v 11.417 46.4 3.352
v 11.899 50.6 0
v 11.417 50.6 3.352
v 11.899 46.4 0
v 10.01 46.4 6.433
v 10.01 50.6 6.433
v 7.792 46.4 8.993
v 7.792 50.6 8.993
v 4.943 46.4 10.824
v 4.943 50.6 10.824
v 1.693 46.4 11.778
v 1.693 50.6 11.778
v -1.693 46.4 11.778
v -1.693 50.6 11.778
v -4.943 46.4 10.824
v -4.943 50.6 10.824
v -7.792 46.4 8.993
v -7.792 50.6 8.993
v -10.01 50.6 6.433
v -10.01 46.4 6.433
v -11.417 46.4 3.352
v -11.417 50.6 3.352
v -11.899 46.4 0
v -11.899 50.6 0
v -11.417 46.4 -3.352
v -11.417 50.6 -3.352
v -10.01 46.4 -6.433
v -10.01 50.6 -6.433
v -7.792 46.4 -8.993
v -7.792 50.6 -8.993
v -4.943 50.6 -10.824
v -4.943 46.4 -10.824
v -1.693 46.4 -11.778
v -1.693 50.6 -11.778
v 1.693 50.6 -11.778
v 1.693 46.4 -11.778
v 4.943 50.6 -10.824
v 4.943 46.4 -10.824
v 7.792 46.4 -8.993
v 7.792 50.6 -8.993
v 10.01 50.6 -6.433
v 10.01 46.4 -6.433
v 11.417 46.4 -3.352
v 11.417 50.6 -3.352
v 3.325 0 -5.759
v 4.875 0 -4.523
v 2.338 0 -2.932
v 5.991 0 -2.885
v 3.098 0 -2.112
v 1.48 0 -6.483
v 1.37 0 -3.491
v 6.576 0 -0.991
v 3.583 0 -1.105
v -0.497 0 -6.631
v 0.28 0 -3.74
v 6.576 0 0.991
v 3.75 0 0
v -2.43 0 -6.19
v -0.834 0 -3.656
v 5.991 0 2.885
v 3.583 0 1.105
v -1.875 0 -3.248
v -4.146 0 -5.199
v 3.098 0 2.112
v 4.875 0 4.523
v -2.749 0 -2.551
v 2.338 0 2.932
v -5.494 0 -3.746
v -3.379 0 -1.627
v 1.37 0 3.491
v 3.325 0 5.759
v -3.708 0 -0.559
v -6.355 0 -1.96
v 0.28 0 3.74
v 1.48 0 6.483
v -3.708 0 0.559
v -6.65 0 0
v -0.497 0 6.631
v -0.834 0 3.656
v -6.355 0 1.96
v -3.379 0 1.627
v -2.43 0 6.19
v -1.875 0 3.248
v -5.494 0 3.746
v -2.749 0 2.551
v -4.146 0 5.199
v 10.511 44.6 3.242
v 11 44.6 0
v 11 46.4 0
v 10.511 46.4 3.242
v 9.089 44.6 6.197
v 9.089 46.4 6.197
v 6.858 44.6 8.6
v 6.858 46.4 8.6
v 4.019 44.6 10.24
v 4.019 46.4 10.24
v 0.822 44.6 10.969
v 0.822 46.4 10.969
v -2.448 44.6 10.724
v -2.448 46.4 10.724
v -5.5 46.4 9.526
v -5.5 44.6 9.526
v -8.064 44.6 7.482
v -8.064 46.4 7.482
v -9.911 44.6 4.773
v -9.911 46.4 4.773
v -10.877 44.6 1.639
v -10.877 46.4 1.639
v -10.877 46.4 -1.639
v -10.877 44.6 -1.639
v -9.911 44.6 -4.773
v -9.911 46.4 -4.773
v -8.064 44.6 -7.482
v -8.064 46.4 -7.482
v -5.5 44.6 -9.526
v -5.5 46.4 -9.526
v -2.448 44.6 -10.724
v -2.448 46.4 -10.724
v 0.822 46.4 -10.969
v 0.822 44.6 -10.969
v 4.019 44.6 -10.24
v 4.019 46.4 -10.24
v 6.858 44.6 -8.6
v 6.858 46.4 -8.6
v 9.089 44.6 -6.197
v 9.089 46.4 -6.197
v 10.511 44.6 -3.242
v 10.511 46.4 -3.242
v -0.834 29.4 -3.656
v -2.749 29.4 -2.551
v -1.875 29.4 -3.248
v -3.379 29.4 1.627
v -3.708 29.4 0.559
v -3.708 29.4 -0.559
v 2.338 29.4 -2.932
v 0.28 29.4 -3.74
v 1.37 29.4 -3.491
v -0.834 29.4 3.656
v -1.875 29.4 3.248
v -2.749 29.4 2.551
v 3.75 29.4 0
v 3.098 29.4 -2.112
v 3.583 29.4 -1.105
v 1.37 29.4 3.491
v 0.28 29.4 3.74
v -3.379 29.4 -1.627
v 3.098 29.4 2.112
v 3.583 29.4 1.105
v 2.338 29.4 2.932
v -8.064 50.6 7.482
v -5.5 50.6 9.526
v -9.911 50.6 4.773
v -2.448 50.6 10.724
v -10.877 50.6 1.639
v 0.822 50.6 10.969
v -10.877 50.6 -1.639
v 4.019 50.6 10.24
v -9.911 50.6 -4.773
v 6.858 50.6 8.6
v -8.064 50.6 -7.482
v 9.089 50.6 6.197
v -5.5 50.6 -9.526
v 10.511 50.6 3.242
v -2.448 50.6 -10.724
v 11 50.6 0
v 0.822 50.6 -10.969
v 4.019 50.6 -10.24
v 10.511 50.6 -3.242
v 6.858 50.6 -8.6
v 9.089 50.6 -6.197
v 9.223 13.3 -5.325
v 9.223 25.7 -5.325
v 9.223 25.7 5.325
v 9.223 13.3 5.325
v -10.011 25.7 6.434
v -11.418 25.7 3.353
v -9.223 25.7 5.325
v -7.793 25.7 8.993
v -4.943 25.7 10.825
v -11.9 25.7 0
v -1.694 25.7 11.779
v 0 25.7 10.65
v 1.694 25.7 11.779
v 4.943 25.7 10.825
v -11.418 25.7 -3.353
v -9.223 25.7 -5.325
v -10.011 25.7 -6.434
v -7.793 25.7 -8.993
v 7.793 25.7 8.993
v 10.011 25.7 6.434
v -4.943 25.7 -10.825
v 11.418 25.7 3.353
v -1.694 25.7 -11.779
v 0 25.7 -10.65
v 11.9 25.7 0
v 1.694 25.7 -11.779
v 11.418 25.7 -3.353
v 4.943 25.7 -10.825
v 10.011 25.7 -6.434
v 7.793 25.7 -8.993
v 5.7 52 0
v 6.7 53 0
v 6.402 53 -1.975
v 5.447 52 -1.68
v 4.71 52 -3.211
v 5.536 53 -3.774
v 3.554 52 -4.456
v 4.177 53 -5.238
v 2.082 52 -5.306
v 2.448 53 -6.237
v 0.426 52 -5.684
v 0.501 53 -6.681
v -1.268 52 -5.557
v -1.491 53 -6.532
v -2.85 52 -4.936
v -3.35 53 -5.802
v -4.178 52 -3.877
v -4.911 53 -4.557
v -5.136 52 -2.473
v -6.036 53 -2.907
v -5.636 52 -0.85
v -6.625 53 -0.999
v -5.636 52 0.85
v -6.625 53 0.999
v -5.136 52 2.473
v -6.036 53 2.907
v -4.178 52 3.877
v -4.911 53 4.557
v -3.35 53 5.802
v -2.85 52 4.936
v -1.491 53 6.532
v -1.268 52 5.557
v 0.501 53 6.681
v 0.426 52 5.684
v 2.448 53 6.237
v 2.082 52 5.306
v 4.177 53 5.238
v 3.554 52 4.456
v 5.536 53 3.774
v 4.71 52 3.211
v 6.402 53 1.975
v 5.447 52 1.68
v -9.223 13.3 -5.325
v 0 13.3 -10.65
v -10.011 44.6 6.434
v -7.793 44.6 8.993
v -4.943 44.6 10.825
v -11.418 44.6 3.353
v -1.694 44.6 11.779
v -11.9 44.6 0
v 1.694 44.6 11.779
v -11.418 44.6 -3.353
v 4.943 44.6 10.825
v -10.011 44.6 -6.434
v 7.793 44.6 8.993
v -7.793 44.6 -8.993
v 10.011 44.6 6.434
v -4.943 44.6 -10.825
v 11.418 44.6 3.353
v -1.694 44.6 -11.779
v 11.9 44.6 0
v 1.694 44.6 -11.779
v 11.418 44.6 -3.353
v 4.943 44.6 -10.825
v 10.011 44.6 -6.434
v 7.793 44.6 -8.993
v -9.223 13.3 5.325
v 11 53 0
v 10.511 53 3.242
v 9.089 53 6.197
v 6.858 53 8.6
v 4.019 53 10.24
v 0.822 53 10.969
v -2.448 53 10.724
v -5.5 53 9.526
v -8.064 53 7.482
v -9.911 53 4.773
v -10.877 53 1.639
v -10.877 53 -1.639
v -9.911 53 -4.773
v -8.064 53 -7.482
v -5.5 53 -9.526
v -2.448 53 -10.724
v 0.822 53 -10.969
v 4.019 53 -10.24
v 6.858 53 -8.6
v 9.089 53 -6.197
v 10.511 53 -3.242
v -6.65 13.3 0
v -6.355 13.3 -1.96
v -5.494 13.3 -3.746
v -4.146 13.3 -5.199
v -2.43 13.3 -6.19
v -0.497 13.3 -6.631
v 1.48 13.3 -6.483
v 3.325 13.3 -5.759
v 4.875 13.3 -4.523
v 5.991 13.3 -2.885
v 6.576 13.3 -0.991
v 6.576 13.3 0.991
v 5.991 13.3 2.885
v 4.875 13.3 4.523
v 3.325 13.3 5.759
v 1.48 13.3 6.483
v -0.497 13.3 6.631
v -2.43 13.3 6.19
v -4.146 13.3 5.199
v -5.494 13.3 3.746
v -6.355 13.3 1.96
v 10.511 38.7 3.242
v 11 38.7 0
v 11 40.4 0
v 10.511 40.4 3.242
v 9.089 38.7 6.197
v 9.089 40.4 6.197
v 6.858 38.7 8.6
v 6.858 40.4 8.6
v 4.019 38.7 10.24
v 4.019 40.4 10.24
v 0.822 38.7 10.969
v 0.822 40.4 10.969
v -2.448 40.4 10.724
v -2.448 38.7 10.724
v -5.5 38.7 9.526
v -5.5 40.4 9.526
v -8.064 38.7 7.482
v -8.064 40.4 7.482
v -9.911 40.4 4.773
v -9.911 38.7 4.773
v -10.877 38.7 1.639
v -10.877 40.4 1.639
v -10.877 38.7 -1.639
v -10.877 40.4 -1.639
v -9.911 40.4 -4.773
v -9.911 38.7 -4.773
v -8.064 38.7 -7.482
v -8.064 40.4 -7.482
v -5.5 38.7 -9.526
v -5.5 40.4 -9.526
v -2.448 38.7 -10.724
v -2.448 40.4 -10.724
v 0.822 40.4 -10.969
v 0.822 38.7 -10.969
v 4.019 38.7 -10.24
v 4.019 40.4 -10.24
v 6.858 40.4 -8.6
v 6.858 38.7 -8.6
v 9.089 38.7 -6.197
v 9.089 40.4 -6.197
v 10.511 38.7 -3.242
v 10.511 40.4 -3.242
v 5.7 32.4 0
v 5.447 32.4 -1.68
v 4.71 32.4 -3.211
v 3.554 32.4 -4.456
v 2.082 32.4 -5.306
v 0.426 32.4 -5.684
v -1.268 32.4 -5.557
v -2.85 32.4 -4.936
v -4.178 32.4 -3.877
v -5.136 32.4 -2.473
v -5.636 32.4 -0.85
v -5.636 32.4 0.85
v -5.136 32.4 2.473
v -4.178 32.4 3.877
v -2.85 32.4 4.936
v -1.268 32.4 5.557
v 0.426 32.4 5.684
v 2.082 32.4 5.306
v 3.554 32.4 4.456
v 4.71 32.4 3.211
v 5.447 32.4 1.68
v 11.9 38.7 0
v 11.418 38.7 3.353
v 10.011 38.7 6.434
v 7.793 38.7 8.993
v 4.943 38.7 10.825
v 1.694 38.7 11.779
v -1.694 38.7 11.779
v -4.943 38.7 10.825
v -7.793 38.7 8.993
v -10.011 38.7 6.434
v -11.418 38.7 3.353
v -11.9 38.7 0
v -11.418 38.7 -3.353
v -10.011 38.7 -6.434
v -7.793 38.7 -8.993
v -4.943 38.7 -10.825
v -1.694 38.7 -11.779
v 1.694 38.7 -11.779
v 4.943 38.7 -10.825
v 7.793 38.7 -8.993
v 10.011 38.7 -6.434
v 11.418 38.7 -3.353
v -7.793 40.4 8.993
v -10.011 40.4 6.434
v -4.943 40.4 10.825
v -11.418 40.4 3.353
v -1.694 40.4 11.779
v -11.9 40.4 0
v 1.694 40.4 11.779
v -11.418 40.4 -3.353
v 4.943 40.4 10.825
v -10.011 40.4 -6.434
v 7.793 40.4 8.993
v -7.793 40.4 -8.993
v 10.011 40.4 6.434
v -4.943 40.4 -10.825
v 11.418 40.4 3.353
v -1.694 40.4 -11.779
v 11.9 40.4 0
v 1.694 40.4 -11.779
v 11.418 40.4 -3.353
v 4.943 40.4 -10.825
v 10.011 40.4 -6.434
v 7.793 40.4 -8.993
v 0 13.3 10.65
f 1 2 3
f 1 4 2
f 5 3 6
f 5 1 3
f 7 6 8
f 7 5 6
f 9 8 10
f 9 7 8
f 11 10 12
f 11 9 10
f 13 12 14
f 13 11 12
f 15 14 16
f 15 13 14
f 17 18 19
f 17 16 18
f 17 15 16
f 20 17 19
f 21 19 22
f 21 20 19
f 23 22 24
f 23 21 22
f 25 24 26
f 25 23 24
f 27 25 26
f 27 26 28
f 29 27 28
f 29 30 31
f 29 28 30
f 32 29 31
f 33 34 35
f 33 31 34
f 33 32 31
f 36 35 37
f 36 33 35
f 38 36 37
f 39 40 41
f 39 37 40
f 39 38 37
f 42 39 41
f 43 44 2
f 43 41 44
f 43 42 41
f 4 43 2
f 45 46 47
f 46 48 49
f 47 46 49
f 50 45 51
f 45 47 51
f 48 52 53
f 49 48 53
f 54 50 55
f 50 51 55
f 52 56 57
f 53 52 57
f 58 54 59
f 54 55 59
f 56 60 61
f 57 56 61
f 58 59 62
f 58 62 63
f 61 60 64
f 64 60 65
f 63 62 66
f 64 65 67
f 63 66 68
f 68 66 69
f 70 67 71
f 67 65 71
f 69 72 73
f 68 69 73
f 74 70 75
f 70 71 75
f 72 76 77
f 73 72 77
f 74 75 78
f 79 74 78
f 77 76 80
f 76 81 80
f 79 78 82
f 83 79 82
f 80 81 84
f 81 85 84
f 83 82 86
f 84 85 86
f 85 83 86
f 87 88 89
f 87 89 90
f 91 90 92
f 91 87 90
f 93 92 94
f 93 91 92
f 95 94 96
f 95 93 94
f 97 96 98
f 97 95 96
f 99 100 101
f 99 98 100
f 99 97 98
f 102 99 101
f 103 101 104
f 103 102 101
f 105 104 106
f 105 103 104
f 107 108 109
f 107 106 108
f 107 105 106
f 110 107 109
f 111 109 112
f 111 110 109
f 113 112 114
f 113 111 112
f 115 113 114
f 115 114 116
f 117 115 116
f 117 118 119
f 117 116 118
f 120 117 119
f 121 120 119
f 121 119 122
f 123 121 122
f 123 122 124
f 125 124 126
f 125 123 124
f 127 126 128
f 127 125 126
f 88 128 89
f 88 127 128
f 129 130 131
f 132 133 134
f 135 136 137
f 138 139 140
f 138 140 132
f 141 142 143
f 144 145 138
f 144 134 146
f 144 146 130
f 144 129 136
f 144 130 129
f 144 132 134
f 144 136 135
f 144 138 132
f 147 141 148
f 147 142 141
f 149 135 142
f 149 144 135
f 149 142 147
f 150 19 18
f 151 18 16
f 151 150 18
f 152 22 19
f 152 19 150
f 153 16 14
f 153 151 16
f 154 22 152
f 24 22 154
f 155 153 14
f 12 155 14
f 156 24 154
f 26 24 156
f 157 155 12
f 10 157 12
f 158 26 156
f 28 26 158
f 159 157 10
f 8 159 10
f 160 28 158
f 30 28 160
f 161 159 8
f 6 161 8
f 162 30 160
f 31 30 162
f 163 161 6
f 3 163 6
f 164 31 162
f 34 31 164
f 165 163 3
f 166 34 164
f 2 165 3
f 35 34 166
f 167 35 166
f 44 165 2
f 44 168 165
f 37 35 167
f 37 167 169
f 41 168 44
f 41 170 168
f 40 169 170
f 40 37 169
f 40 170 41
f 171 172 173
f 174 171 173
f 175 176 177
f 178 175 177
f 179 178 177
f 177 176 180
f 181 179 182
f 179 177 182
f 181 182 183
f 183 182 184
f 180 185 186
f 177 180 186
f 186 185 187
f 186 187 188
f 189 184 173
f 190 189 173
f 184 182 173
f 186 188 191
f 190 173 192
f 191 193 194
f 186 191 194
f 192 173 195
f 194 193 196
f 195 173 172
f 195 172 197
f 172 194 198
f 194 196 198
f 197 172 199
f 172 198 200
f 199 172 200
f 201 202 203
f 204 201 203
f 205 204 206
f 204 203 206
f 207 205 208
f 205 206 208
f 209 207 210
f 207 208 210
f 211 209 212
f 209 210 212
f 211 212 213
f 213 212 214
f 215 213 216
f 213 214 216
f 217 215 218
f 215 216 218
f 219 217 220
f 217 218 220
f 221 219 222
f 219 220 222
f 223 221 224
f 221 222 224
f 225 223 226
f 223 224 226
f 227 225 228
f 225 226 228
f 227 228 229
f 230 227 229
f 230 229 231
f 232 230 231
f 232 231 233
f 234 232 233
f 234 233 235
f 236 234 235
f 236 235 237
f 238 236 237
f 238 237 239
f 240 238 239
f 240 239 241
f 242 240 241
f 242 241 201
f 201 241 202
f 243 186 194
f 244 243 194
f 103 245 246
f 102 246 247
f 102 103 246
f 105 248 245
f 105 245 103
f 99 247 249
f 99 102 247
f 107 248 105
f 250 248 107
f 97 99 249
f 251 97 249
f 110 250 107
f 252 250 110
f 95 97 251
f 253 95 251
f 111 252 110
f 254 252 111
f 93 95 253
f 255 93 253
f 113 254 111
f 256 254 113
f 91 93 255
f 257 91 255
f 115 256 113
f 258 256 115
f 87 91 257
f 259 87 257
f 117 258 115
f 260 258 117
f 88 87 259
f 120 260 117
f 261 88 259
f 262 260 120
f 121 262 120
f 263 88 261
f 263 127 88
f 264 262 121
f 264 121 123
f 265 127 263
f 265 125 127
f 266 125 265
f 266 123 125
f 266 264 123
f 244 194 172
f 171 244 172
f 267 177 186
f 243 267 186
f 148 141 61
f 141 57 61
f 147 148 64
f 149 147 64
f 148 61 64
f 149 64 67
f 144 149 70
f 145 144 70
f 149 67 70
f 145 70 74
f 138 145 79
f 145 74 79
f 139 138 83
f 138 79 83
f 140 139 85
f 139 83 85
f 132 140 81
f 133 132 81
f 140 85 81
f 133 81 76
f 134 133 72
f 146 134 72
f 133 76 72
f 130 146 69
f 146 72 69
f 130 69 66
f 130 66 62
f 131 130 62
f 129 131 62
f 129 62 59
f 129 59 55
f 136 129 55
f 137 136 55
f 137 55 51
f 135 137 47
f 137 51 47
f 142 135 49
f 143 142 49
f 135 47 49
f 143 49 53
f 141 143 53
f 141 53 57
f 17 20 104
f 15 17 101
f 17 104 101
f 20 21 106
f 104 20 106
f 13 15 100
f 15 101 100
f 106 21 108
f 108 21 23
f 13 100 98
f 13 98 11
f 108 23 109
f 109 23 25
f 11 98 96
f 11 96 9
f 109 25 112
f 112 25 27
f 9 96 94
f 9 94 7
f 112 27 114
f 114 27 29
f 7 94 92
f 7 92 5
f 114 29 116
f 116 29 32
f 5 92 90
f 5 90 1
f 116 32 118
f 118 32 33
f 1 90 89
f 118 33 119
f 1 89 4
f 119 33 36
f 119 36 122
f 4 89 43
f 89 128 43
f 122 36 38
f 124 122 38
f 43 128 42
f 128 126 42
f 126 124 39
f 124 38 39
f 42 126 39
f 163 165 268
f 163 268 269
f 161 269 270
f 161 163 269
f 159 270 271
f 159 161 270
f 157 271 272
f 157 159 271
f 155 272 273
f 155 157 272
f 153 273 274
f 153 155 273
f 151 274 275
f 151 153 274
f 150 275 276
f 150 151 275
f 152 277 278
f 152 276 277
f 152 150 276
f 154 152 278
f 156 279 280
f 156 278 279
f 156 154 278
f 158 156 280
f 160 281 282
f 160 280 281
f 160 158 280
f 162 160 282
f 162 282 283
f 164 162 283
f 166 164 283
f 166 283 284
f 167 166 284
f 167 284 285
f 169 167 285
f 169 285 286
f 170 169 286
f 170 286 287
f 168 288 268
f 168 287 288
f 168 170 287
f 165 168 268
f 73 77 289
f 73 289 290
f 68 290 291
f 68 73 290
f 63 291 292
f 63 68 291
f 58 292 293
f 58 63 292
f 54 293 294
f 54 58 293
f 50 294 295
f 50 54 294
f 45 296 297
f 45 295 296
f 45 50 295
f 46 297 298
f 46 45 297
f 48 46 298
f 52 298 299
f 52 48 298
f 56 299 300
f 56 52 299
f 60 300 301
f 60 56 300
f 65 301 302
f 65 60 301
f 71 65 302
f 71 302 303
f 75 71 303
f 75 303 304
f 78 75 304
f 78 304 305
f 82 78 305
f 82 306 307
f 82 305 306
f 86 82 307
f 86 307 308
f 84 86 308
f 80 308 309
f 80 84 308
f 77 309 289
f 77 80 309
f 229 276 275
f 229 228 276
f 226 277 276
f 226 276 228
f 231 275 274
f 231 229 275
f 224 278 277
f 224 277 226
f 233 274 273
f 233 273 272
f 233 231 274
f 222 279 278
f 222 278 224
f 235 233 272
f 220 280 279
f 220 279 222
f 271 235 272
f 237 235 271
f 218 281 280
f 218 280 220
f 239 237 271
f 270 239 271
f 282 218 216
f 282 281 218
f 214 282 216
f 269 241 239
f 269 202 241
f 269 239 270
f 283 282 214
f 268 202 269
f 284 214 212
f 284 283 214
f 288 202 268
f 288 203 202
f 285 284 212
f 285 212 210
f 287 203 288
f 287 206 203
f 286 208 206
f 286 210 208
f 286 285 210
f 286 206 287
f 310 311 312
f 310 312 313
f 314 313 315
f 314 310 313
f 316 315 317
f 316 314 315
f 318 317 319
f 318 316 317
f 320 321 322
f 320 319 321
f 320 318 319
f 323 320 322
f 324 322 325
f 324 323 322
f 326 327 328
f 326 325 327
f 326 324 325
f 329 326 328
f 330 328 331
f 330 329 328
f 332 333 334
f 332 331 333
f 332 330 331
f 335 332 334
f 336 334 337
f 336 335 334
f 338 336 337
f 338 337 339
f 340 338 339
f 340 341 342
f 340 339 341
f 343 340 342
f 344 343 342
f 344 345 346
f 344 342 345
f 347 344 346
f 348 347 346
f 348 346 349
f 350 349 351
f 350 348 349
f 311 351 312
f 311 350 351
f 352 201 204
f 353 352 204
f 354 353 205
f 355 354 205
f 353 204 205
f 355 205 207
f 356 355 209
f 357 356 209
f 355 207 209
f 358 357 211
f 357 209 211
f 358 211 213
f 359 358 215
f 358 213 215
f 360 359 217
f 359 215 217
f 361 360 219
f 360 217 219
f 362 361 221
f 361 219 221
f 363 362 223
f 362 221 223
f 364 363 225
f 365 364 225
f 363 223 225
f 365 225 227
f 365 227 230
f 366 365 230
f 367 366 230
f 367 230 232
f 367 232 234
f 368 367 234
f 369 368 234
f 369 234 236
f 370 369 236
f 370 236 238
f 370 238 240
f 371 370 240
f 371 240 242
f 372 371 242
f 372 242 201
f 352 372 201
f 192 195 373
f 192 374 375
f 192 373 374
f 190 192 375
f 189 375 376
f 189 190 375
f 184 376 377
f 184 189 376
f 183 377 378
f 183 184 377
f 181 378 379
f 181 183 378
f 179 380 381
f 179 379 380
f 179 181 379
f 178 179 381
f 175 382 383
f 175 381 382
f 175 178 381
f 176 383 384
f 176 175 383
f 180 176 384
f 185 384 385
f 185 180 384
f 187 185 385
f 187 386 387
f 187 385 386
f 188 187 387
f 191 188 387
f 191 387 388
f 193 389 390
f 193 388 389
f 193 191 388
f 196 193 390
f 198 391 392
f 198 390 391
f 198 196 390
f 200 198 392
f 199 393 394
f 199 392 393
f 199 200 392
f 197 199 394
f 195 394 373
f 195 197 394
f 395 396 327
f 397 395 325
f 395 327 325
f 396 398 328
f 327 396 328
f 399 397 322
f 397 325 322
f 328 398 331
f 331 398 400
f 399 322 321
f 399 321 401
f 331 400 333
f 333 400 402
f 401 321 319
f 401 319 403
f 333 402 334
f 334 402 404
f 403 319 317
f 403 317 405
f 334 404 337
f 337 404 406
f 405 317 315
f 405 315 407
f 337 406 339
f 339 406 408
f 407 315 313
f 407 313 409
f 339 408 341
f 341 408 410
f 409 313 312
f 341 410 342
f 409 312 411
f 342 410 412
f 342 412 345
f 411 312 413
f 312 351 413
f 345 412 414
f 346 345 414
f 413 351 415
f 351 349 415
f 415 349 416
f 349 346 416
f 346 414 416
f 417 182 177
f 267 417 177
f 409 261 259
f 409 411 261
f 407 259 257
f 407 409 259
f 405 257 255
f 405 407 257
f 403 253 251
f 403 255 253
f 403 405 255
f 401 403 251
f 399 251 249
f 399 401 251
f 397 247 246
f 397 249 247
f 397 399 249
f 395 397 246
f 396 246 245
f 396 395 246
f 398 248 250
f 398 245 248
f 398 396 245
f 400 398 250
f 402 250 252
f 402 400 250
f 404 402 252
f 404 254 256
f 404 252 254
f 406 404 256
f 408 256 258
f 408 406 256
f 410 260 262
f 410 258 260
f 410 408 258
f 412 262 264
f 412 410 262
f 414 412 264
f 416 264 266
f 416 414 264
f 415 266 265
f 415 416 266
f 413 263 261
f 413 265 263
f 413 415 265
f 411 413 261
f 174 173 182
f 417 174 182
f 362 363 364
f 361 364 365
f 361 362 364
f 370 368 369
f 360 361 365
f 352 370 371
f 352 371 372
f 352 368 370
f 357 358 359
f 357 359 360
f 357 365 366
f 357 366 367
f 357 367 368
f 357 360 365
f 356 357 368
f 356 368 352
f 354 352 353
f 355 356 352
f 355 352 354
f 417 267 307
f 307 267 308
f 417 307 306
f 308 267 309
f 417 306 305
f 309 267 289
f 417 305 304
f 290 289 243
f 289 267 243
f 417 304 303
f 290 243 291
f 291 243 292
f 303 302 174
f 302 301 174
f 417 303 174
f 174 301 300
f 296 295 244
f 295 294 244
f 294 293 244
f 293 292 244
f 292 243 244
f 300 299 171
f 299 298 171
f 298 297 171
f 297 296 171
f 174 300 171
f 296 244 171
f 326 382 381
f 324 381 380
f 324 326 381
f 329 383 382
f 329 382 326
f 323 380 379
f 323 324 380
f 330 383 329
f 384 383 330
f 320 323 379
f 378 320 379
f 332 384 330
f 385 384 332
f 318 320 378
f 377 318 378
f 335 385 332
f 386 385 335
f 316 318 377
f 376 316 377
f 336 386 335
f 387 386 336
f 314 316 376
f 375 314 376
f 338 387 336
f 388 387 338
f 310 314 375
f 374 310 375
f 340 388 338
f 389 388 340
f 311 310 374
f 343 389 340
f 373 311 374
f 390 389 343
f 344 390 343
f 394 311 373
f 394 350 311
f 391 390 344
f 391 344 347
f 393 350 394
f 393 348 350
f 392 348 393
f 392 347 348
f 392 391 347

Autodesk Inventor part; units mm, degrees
ref_plane "YZ Plane" through (0, 0, 0) normal (1, 0, 0) x (0, 1, 0)
ref_plane "XZ Plane" through (0, 0, 0) normal (0, 1, 0) x (-1, 0, 0)
ref_plane "XY Plane" through (0, 0, 0) normal (0, 0, 1) x (1, 0, 0)
sketch "Sketch1" plane through (0, 0, 0) normal (0, 1, 0) x (-1, 0, 0)
  circle A0 centre (0, 0) radius 6.65
  dimension "d0" = 13.3
extrude "Extrusion1" add sketch "Sketch1" along normal blind 13.3
sketch "Sketch2" plane through (0, 13.3, 0) normal (0, 1, 0) x (1, 0, 0)
  line L0 (0, 10.65) -> (9.2232, 5.325)
  line L1 (9.2232, 5.325) -> (9.2232, -5.325)
  line L2 (9.2232, -5.325) -> (0, -10.65)
  line L3 (0, -10.65) -> (-9.2232, -5.325)
  line L4 (-9.2232, -5.325) -> (-9.2232, 5.325)
  line L5 (-9.2232, 5.325) -> (0, 10.65)
  point P0 (0, 0)
  point P1 (0, 0)
extrude "Extrusion2" add sketch "Sketch2" along normal blind 12.4
sketch "Sketch3" plane through (0, 25.7, 0) normal (0, 1, 0) x (1, 0, 0)
  circle A0 centre (0, 0) radius 11.9
  dimension "d6" = 23.8
extrude "Extrusion3" add sketch "Sketch3" along normal blind 13
sketch "Sketch4" plane through (0, 38.7, 0) normal (0, 1, 0) x (1, 0, 0)
  circle A0 centre (0, 0) radius 11
  dimension "d9" = 22
extrude "Extrusion4" add sketch "Sketch4" along normal blind 1.7
sketch "Sketch5" plane through (0, 40.4, 0) normal (0, 1, 0) x (1, 0, 0)
  circle A0 centre (0, 0) radius 11.9
extrude "Extrusion5" add sketch "Sketch5" along normal blind 4.2
sketch "Sketch6" plane through (0, 44.6, 0) normal (0, 1, 0) x (1, 0, 0)
  circle A0 centre (0, 0) radius 11
extrude "Extrusion6" add sketch "Sketch6" along normal blind 1.8
sketch "Sketch7" plane through (0, 46.4, 0) normal (0, 1, 0) x (1, 0, 0)
  circle A0 centre (0, 0) radius 11.8989
extrude "Extrusion7" add sketch "Sketch7" along normal blind 4.2
sketch "Sketch8" plane through (0, 50.6, 0) normal (0, 1, 0) x (1, 0, 0)
  circle A0 centre (0, 0) radius 11
extrude "Extrusion8" add sketch "Sketch8" along normal blind 2.4
thread "Thread1"
sketch "Sketch9" plane through (0, 53, 0) normal (0, 1, 0) x (1, 0, 0)
  circle A0 centre (0, 0) radius 5.7
  dimension "d22" = 11.4
extrude "Extrusion9" cut sketch "Sketch9" against normal blind 20.6
chamfer "Chamfer1" distance 1 angle 45 1 edges at (-5.7, 53, 0)
sketch "Sketch10" plane through (0, 0, 0) normal (0, -1, 0) x (1, 0, 0)
  circle A0 centre (0, 0) radius 3.75
  dimension "d28" = 7.5
extrude "Extrusion10" cut sketch "Sketch10" against normal blind 29.4
properties part number "AcopleHembra"
